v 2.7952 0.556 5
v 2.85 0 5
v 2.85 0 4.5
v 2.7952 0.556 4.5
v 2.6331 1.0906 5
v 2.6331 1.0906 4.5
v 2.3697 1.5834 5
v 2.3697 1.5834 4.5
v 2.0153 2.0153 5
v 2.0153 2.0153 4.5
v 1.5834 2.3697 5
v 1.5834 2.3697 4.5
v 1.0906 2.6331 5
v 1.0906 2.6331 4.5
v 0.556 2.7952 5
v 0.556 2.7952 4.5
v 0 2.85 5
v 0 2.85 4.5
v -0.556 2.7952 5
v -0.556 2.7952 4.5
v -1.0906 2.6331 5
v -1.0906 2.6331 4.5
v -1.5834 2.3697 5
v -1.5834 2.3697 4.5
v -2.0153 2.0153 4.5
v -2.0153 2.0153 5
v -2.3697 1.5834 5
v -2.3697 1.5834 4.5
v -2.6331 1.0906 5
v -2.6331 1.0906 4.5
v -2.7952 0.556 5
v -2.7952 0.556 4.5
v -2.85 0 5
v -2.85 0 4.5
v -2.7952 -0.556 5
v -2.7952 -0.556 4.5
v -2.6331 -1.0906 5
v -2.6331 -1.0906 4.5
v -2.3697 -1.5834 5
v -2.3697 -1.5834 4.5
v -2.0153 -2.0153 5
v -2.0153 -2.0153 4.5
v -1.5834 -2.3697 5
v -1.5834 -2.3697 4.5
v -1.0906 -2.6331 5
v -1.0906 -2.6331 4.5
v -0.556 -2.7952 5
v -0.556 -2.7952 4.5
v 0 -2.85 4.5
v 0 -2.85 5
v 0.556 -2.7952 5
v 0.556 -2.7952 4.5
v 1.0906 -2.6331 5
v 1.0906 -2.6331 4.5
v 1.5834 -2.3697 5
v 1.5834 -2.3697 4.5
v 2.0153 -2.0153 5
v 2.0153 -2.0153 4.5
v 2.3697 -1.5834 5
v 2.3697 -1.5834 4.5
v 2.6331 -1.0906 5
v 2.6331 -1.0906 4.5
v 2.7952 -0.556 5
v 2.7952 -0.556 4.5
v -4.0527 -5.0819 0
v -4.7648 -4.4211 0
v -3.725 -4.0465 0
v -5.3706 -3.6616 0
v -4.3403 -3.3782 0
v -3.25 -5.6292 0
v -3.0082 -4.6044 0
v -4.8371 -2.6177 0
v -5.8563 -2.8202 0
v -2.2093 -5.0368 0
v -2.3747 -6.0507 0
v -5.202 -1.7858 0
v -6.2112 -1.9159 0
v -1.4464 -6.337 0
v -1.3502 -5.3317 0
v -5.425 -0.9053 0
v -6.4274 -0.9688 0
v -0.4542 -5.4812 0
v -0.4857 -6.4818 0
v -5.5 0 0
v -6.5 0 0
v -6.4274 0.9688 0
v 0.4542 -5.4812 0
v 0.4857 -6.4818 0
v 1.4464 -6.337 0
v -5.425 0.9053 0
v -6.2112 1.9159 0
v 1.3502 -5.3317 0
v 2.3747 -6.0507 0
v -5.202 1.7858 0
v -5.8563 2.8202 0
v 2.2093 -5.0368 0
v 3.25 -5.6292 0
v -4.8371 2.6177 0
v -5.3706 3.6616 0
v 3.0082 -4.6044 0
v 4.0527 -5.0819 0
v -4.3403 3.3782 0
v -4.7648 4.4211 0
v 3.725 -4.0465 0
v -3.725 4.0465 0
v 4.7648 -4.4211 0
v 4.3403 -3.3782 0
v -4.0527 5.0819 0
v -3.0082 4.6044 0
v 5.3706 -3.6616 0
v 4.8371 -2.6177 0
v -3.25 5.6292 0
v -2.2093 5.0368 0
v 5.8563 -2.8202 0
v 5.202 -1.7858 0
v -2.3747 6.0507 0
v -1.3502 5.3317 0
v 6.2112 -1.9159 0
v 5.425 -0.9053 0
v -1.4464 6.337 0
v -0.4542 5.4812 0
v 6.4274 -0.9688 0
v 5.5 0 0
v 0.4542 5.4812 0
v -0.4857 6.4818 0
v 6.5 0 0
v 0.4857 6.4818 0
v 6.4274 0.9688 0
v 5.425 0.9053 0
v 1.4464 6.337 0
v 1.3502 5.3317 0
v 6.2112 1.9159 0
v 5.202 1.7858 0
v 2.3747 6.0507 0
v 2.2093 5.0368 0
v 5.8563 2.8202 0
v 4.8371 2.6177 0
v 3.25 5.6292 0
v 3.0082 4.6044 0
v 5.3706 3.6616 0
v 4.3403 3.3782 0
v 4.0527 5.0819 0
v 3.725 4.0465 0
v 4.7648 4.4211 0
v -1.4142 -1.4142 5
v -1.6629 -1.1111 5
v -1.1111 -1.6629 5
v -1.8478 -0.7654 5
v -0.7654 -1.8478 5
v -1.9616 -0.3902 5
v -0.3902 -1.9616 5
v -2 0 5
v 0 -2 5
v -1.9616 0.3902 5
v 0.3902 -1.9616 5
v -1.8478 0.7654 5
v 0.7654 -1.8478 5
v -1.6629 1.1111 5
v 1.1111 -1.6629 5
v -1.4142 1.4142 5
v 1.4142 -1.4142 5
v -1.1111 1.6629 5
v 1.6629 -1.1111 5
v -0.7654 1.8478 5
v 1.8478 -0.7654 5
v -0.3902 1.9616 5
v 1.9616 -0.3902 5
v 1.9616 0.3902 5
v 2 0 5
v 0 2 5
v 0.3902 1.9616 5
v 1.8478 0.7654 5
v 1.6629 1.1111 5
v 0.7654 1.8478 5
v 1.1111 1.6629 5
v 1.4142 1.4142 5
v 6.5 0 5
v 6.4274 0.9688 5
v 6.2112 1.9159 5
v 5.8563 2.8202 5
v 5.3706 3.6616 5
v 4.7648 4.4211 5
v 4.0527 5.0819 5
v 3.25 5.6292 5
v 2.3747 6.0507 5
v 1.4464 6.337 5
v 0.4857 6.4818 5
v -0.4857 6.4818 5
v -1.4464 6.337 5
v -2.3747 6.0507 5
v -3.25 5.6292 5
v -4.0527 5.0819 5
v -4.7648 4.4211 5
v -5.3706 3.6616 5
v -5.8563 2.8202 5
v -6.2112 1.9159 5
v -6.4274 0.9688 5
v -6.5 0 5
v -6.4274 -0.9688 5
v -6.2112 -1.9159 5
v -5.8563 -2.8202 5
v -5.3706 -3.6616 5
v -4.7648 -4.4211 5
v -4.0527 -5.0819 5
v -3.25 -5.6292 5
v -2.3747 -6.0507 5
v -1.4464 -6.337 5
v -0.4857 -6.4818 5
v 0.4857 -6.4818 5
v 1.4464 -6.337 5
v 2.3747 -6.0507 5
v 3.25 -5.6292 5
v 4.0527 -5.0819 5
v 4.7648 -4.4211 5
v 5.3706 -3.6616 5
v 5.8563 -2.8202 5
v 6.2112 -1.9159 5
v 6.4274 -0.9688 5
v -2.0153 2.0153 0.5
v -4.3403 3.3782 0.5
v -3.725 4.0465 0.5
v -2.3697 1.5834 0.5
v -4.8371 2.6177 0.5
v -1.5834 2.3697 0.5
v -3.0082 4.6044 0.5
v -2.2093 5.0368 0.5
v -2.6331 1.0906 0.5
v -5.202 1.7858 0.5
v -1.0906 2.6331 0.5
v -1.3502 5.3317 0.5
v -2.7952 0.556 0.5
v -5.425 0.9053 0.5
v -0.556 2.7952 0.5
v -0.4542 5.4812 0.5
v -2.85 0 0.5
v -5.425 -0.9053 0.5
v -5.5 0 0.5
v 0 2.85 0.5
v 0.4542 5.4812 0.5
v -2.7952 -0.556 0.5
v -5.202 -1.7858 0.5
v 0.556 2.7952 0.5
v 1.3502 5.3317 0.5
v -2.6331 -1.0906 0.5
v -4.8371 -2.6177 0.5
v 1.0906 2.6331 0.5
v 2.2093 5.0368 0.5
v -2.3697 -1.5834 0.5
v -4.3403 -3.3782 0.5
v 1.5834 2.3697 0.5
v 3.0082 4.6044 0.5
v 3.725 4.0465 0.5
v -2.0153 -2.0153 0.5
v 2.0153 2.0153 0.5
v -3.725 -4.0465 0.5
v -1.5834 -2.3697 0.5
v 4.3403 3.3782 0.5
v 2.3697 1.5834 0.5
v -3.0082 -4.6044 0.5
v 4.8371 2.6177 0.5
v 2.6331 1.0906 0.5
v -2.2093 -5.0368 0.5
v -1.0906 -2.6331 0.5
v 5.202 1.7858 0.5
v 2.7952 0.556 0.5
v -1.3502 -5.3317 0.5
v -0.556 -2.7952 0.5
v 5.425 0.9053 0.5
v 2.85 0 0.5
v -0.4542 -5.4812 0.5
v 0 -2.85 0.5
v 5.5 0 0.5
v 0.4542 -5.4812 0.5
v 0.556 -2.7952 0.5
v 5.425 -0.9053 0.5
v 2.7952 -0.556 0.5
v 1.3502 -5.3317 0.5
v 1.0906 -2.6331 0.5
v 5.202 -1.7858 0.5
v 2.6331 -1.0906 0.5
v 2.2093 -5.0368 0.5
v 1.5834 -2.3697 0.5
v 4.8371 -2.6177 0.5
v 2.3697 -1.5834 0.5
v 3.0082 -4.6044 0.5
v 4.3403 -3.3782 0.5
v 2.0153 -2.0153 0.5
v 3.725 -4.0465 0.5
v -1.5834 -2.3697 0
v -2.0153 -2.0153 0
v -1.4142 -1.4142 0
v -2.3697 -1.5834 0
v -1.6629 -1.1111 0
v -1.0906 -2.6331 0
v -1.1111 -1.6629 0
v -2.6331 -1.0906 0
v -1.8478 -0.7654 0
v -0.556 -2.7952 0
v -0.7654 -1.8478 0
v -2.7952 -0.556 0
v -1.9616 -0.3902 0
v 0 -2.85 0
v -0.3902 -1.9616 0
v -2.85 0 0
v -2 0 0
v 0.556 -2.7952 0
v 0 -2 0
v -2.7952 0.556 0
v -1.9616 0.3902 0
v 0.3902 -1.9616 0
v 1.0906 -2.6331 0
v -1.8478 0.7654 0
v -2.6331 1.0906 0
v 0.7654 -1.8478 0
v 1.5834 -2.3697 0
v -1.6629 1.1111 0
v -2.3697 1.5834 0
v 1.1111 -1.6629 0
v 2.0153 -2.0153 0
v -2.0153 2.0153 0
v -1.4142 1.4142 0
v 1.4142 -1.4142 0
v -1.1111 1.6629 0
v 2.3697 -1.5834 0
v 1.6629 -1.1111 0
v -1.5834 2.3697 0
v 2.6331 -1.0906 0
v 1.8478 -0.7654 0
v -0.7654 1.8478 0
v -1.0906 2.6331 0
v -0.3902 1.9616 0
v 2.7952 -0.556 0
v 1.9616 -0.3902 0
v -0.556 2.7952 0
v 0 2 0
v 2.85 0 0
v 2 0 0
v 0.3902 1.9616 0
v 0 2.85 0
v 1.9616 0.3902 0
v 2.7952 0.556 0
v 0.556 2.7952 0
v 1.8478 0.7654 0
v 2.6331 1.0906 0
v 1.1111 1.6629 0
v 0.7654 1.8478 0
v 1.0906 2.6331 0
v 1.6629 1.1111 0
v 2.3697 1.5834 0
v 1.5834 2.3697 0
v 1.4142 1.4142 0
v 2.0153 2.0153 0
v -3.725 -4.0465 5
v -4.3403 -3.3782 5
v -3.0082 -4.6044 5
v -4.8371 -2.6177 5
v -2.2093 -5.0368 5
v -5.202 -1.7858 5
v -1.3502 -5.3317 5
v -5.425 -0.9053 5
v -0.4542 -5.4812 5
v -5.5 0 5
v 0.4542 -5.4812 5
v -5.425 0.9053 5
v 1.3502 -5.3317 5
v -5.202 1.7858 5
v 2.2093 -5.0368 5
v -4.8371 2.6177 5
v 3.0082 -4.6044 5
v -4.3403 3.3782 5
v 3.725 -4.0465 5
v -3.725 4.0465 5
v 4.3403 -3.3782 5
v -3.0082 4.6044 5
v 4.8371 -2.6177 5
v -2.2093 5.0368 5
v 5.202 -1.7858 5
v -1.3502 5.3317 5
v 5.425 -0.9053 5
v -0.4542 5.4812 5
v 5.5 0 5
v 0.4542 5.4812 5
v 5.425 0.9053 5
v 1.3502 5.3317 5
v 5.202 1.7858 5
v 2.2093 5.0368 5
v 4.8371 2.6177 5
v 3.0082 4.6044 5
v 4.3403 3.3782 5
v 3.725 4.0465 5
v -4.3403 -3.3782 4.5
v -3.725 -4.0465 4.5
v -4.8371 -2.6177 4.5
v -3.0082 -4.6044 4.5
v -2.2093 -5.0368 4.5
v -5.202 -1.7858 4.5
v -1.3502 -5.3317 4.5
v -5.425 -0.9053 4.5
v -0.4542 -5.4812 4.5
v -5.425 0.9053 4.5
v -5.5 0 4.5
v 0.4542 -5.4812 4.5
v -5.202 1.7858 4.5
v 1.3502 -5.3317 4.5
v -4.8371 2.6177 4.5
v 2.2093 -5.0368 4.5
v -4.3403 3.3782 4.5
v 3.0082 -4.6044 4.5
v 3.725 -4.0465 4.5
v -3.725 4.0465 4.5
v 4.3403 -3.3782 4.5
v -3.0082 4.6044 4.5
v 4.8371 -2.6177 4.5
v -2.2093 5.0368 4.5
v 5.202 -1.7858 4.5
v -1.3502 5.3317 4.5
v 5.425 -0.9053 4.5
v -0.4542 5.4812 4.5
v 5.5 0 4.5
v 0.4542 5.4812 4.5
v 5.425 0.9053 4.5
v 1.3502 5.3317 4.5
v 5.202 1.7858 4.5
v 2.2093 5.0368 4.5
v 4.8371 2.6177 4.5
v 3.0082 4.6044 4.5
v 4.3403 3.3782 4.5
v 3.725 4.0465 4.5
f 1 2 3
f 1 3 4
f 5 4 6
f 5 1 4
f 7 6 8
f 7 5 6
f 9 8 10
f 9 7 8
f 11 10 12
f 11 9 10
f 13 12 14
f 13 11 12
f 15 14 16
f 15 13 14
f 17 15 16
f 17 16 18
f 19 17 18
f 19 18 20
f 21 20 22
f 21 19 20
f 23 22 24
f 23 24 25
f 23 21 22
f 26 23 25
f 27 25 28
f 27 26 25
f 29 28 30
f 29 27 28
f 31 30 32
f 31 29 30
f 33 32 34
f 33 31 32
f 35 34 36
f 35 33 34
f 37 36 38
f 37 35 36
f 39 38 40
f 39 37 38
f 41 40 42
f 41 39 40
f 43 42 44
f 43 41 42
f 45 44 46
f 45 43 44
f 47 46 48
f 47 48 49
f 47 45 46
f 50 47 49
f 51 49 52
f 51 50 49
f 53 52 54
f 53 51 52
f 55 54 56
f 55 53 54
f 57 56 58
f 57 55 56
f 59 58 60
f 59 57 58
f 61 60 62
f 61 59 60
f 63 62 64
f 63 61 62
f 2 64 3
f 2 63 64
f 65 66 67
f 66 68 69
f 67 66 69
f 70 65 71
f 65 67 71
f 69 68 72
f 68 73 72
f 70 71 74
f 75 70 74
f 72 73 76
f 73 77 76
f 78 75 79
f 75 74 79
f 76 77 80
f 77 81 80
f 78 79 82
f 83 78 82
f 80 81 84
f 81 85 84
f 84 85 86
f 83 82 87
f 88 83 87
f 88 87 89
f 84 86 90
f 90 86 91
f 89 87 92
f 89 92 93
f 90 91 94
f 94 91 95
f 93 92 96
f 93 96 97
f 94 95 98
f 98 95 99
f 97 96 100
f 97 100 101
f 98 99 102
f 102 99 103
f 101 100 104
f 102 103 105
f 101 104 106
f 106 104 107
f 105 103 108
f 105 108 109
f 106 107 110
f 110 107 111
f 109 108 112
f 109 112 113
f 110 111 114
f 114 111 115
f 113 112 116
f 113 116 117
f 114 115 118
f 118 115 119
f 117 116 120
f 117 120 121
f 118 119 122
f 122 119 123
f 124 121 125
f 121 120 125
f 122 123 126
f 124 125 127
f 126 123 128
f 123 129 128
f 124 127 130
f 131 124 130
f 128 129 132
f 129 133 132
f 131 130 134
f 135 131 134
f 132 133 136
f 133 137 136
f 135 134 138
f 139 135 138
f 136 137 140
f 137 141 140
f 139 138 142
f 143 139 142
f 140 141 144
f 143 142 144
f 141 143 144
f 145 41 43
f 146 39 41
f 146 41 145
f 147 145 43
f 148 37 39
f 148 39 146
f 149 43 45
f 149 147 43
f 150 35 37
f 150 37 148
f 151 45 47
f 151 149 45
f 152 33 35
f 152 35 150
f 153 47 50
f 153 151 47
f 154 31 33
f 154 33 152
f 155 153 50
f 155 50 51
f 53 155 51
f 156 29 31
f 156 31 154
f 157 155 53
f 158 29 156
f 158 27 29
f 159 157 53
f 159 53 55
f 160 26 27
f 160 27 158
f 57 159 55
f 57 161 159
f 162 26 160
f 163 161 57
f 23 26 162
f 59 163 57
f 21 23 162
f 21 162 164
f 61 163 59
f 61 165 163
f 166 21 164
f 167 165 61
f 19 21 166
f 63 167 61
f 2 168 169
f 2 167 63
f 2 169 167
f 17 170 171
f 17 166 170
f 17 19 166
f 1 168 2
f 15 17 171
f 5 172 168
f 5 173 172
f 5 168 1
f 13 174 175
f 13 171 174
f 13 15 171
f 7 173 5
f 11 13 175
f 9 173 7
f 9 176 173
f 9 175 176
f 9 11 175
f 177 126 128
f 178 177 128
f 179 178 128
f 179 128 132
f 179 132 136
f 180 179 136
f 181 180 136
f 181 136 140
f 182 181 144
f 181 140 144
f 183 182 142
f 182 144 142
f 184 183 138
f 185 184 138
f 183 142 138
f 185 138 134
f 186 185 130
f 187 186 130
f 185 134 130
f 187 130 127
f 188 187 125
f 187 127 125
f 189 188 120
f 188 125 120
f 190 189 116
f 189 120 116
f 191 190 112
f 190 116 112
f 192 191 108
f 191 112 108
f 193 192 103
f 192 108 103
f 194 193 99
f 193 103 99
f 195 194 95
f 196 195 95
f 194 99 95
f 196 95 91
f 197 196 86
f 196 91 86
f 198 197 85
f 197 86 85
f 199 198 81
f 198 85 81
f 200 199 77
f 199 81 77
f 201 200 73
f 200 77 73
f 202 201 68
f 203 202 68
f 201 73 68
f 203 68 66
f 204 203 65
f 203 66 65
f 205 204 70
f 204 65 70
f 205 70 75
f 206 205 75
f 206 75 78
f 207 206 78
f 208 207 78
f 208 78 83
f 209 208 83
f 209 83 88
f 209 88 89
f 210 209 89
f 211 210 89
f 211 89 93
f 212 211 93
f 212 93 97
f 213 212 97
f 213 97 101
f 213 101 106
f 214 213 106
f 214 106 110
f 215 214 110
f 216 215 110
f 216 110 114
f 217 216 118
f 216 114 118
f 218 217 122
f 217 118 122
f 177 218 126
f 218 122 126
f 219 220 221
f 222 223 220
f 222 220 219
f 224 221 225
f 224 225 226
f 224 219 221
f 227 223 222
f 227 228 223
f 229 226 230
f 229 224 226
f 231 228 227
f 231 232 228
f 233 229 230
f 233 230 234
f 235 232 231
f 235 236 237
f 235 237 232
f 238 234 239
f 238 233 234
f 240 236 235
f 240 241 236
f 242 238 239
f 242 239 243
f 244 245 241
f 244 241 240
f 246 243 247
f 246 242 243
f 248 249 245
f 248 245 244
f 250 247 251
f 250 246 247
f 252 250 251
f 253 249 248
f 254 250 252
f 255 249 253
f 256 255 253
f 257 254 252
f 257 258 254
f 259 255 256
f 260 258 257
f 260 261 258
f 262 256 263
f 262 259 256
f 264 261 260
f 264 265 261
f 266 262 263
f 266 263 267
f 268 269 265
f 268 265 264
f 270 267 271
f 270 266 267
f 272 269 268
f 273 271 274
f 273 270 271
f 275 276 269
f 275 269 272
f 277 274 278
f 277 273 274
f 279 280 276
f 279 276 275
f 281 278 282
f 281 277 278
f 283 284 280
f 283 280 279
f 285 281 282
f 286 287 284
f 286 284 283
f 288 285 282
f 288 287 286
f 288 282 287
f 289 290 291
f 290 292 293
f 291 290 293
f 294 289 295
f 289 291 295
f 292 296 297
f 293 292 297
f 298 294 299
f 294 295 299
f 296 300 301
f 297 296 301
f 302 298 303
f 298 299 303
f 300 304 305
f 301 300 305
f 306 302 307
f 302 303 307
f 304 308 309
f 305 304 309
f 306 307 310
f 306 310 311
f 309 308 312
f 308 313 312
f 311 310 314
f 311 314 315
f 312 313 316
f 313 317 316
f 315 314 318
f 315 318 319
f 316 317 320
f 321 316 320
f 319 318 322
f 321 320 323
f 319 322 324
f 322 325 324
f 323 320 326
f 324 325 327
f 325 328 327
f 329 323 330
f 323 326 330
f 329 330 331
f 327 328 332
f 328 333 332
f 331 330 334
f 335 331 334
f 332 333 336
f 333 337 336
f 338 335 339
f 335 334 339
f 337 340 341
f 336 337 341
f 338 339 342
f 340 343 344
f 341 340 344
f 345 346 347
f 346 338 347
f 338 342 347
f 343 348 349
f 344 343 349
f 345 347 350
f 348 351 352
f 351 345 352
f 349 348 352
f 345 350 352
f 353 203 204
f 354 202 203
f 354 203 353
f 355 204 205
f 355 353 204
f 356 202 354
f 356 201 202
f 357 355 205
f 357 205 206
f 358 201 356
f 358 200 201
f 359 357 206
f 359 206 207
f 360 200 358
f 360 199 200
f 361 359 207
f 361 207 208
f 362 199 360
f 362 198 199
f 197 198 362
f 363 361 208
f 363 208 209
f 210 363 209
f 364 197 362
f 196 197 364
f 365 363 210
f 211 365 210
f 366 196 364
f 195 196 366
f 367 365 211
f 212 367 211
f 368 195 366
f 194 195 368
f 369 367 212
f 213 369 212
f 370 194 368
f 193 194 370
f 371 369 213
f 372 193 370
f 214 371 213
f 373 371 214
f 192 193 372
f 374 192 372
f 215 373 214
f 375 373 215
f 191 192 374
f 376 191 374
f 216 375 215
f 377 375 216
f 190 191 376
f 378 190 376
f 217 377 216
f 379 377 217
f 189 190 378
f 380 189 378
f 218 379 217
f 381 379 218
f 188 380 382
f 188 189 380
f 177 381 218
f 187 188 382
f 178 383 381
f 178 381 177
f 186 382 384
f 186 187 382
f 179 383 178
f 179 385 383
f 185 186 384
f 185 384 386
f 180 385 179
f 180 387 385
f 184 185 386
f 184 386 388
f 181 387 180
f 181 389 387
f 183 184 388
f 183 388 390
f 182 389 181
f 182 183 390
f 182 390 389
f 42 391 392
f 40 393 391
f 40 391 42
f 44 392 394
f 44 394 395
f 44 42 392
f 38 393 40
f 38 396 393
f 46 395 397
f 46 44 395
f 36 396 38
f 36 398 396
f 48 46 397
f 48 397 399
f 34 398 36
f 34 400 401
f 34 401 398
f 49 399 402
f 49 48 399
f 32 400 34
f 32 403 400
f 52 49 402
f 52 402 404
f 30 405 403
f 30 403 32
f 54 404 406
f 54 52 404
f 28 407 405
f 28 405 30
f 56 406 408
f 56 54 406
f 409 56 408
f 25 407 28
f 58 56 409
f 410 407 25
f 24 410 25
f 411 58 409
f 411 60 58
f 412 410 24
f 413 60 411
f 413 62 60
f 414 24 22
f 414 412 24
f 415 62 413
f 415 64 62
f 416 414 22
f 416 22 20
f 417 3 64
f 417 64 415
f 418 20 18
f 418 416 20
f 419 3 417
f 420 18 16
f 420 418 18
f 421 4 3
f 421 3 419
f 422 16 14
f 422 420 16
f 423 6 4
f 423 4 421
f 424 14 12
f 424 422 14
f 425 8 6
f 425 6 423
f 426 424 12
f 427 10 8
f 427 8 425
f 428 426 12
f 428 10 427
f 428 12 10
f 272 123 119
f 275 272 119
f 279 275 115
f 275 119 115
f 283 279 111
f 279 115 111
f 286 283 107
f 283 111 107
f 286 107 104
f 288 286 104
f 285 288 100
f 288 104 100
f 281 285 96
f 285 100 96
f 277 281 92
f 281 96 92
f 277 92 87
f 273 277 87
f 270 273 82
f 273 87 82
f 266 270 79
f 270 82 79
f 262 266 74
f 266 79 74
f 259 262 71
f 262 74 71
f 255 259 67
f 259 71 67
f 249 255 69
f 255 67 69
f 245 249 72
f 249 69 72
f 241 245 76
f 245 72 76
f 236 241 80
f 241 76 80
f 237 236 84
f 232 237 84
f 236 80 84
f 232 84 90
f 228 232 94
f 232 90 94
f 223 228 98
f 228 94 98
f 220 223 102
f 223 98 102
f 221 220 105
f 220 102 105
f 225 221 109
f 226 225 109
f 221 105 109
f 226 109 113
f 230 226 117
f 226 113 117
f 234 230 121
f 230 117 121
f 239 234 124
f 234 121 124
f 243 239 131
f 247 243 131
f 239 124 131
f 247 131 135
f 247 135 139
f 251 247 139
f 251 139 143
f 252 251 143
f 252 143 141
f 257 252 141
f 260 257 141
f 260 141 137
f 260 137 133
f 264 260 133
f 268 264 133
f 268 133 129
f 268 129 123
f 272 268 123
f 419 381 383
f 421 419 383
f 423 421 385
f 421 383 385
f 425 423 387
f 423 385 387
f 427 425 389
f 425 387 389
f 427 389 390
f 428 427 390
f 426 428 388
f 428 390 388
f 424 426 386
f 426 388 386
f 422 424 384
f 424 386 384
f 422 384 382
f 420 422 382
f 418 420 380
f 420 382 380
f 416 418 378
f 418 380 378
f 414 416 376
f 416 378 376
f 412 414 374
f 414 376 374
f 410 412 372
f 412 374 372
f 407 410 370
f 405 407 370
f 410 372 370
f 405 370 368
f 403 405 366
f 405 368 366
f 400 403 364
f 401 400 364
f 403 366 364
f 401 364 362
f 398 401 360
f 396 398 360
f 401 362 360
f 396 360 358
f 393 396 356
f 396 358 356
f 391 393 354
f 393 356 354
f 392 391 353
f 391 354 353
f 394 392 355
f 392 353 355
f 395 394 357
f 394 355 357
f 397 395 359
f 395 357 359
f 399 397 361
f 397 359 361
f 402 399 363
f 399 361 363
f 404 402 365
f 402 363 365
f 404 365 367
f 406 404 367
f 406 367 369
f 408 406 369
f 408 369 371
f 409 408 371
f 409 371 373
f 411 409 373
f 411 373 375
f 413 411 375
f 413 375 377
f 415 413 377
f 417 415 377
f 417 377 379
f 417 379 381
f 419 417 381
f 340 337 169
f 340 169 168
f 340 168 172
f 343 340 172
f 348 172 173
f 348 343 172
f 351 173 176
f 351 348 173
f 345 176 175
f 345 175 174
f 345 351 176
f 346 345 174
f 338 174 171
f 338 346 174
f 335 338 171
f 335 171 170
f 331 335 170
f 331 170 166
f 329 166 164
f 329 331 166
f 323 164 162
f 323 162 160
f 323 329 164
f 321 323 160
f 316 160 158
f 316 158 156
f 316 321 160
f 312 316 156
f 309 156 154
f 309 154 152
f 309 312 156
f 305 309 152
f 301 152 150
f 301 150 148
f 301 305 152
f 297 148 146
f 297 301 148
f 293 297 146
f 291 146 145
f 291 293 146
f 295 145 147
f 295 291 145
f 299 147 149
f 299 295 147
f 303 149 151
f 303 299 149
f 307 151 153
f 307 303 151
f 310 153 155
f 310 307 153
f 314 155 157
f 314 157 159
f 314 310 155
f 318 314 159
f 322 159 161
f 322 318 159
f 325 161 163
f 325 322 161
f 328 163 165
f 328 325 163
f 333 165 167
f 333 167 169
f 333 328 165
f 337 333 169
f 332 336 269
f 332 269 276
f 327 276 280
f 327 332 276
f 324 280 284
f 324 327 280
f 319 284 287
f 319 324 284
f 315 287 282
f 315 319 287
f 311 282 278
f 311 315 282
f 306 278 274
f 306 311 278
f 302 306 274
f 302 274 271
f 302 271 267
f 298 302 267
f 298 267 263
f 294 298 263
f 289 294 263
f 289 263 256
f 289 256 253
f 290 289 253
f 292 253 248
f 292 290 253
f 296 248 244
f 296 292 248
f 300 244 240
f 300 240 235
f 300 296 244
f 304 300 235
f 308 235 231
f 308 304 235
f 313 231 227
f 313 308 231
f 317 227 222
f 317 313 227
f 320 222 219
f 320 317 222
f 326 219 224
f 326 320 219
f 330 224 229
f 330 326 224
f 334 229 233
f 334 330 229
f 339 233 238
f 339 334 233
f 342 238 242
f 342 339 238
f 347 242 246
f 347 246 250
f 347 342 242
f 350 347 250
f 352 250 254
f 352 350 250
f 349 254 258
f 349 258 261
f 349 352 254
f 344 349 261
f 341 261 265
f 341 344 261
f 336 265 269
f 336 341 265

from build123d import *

# Parameters (mm, degrees)
SKETCH_R        = 6.5
SKETCH_R_2      = 2
PAD_DEPTH       = 5
SKETCH001_R     = 5.5
SKETCH001_R_2   = 2.85
POCKET_DEPTH    = 0.5
SKETCH002_R     = 5.5
SKETCH002_R_2   = 2.85
POCKET001_DEPTH = 0.5


with BuildPart() as part:
    # Sketch → Pad (new body)
    with BuildSketch(Plane.XY):
        Circle(SKETCH_R)
        Circle(SKETCH_R_2, mode=Mode.SUBTRACT)
    extrude(amount=PAD_DEPTH)

    # Sketch001 (on Face4 of Pad) → Pocket (cut)
    with BuildSketch(Plane.XY.offset(5)):
        Circle(SKETCH001_R)
        Circle(SKETCH001_R_2, mode=Mode.SUBTRACT)
    extrude(amount=-POCKET_DEPTH, mode=Mode.SUBTRACT)

    # Sketch002 (on Face2 of Pocket) → Pocket001 (cut)
    with BuildSketch(Plane(origin=(0, 0, 0), x_dir=(1, 0, 0), z_dir=(0, 0, -1))):
        Circle(SKETCH002_R)
        Circle(SKETCH002_R_2, mode=Mode.SUBTRACT)
    extrude(amount=-POCKET001_DEPTH, mode=Mode.SUBTRACT)


solid = part.part
